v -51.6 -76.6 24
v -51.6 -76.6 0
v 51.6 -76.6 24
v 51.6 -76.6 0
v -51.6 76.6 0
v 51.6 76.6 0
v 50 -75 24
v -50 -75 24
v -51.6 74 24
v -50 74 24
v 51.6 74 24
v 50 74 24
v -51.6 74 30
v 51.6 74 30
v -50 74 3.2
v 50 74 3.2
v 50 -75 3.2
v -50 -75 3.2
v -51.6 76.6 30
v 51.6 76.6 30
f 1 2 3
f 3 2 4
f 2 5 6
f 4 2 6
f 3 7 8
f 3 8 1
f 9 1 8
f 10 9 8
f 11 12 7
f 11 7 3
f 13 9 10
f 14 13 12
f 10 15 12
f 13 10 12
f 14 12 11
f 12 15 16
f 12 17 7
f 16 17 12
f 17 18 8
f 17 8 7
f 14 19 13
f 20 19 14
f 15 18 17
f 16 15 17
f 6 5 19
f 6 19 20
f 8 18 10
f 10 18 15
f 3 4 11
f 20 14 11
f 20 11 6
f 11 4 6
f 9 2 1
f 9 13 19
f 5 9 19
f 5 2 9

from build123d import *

# Parameters (mm, degrees)
F0_W     = 103.2
F0_H     = 153.2
F0_W_2   = 100
F0_H_2   = 150
F1_DEPTH = 24
F2_W     = 100
F2_H     = 150
F3_DEPTH = 3.2
F4_W     = 103.2
F4_H     = 2.6
F5_DEPTH = 30


with BuildPart() as f1:
    # F0 (on Top) → F1 (new body)
    with BuildSketch(Plane.XY):
        Rectangle(F0_W, F0_H)
        Rectangle(F0_W_2, F0_H_2, mode=Mode.SUBTRACT)
    extrude(amount=F1_DEPTH)

    # F2 (on Top) → F3 (join)
    with BuildSketch(Plane.XY):
        Rectangle(F2_W, F2_H)
    extrude(amount=F3_DEPTH)

    # F4 (on Top) → F5 (join)
    with BuildSketch(Plane.XY):
        with Locations((0, 75.3)):
            Rectangle(F4_W, F4_H)
    extrude(amount=F5_DEPTH)


solid = f1.part
